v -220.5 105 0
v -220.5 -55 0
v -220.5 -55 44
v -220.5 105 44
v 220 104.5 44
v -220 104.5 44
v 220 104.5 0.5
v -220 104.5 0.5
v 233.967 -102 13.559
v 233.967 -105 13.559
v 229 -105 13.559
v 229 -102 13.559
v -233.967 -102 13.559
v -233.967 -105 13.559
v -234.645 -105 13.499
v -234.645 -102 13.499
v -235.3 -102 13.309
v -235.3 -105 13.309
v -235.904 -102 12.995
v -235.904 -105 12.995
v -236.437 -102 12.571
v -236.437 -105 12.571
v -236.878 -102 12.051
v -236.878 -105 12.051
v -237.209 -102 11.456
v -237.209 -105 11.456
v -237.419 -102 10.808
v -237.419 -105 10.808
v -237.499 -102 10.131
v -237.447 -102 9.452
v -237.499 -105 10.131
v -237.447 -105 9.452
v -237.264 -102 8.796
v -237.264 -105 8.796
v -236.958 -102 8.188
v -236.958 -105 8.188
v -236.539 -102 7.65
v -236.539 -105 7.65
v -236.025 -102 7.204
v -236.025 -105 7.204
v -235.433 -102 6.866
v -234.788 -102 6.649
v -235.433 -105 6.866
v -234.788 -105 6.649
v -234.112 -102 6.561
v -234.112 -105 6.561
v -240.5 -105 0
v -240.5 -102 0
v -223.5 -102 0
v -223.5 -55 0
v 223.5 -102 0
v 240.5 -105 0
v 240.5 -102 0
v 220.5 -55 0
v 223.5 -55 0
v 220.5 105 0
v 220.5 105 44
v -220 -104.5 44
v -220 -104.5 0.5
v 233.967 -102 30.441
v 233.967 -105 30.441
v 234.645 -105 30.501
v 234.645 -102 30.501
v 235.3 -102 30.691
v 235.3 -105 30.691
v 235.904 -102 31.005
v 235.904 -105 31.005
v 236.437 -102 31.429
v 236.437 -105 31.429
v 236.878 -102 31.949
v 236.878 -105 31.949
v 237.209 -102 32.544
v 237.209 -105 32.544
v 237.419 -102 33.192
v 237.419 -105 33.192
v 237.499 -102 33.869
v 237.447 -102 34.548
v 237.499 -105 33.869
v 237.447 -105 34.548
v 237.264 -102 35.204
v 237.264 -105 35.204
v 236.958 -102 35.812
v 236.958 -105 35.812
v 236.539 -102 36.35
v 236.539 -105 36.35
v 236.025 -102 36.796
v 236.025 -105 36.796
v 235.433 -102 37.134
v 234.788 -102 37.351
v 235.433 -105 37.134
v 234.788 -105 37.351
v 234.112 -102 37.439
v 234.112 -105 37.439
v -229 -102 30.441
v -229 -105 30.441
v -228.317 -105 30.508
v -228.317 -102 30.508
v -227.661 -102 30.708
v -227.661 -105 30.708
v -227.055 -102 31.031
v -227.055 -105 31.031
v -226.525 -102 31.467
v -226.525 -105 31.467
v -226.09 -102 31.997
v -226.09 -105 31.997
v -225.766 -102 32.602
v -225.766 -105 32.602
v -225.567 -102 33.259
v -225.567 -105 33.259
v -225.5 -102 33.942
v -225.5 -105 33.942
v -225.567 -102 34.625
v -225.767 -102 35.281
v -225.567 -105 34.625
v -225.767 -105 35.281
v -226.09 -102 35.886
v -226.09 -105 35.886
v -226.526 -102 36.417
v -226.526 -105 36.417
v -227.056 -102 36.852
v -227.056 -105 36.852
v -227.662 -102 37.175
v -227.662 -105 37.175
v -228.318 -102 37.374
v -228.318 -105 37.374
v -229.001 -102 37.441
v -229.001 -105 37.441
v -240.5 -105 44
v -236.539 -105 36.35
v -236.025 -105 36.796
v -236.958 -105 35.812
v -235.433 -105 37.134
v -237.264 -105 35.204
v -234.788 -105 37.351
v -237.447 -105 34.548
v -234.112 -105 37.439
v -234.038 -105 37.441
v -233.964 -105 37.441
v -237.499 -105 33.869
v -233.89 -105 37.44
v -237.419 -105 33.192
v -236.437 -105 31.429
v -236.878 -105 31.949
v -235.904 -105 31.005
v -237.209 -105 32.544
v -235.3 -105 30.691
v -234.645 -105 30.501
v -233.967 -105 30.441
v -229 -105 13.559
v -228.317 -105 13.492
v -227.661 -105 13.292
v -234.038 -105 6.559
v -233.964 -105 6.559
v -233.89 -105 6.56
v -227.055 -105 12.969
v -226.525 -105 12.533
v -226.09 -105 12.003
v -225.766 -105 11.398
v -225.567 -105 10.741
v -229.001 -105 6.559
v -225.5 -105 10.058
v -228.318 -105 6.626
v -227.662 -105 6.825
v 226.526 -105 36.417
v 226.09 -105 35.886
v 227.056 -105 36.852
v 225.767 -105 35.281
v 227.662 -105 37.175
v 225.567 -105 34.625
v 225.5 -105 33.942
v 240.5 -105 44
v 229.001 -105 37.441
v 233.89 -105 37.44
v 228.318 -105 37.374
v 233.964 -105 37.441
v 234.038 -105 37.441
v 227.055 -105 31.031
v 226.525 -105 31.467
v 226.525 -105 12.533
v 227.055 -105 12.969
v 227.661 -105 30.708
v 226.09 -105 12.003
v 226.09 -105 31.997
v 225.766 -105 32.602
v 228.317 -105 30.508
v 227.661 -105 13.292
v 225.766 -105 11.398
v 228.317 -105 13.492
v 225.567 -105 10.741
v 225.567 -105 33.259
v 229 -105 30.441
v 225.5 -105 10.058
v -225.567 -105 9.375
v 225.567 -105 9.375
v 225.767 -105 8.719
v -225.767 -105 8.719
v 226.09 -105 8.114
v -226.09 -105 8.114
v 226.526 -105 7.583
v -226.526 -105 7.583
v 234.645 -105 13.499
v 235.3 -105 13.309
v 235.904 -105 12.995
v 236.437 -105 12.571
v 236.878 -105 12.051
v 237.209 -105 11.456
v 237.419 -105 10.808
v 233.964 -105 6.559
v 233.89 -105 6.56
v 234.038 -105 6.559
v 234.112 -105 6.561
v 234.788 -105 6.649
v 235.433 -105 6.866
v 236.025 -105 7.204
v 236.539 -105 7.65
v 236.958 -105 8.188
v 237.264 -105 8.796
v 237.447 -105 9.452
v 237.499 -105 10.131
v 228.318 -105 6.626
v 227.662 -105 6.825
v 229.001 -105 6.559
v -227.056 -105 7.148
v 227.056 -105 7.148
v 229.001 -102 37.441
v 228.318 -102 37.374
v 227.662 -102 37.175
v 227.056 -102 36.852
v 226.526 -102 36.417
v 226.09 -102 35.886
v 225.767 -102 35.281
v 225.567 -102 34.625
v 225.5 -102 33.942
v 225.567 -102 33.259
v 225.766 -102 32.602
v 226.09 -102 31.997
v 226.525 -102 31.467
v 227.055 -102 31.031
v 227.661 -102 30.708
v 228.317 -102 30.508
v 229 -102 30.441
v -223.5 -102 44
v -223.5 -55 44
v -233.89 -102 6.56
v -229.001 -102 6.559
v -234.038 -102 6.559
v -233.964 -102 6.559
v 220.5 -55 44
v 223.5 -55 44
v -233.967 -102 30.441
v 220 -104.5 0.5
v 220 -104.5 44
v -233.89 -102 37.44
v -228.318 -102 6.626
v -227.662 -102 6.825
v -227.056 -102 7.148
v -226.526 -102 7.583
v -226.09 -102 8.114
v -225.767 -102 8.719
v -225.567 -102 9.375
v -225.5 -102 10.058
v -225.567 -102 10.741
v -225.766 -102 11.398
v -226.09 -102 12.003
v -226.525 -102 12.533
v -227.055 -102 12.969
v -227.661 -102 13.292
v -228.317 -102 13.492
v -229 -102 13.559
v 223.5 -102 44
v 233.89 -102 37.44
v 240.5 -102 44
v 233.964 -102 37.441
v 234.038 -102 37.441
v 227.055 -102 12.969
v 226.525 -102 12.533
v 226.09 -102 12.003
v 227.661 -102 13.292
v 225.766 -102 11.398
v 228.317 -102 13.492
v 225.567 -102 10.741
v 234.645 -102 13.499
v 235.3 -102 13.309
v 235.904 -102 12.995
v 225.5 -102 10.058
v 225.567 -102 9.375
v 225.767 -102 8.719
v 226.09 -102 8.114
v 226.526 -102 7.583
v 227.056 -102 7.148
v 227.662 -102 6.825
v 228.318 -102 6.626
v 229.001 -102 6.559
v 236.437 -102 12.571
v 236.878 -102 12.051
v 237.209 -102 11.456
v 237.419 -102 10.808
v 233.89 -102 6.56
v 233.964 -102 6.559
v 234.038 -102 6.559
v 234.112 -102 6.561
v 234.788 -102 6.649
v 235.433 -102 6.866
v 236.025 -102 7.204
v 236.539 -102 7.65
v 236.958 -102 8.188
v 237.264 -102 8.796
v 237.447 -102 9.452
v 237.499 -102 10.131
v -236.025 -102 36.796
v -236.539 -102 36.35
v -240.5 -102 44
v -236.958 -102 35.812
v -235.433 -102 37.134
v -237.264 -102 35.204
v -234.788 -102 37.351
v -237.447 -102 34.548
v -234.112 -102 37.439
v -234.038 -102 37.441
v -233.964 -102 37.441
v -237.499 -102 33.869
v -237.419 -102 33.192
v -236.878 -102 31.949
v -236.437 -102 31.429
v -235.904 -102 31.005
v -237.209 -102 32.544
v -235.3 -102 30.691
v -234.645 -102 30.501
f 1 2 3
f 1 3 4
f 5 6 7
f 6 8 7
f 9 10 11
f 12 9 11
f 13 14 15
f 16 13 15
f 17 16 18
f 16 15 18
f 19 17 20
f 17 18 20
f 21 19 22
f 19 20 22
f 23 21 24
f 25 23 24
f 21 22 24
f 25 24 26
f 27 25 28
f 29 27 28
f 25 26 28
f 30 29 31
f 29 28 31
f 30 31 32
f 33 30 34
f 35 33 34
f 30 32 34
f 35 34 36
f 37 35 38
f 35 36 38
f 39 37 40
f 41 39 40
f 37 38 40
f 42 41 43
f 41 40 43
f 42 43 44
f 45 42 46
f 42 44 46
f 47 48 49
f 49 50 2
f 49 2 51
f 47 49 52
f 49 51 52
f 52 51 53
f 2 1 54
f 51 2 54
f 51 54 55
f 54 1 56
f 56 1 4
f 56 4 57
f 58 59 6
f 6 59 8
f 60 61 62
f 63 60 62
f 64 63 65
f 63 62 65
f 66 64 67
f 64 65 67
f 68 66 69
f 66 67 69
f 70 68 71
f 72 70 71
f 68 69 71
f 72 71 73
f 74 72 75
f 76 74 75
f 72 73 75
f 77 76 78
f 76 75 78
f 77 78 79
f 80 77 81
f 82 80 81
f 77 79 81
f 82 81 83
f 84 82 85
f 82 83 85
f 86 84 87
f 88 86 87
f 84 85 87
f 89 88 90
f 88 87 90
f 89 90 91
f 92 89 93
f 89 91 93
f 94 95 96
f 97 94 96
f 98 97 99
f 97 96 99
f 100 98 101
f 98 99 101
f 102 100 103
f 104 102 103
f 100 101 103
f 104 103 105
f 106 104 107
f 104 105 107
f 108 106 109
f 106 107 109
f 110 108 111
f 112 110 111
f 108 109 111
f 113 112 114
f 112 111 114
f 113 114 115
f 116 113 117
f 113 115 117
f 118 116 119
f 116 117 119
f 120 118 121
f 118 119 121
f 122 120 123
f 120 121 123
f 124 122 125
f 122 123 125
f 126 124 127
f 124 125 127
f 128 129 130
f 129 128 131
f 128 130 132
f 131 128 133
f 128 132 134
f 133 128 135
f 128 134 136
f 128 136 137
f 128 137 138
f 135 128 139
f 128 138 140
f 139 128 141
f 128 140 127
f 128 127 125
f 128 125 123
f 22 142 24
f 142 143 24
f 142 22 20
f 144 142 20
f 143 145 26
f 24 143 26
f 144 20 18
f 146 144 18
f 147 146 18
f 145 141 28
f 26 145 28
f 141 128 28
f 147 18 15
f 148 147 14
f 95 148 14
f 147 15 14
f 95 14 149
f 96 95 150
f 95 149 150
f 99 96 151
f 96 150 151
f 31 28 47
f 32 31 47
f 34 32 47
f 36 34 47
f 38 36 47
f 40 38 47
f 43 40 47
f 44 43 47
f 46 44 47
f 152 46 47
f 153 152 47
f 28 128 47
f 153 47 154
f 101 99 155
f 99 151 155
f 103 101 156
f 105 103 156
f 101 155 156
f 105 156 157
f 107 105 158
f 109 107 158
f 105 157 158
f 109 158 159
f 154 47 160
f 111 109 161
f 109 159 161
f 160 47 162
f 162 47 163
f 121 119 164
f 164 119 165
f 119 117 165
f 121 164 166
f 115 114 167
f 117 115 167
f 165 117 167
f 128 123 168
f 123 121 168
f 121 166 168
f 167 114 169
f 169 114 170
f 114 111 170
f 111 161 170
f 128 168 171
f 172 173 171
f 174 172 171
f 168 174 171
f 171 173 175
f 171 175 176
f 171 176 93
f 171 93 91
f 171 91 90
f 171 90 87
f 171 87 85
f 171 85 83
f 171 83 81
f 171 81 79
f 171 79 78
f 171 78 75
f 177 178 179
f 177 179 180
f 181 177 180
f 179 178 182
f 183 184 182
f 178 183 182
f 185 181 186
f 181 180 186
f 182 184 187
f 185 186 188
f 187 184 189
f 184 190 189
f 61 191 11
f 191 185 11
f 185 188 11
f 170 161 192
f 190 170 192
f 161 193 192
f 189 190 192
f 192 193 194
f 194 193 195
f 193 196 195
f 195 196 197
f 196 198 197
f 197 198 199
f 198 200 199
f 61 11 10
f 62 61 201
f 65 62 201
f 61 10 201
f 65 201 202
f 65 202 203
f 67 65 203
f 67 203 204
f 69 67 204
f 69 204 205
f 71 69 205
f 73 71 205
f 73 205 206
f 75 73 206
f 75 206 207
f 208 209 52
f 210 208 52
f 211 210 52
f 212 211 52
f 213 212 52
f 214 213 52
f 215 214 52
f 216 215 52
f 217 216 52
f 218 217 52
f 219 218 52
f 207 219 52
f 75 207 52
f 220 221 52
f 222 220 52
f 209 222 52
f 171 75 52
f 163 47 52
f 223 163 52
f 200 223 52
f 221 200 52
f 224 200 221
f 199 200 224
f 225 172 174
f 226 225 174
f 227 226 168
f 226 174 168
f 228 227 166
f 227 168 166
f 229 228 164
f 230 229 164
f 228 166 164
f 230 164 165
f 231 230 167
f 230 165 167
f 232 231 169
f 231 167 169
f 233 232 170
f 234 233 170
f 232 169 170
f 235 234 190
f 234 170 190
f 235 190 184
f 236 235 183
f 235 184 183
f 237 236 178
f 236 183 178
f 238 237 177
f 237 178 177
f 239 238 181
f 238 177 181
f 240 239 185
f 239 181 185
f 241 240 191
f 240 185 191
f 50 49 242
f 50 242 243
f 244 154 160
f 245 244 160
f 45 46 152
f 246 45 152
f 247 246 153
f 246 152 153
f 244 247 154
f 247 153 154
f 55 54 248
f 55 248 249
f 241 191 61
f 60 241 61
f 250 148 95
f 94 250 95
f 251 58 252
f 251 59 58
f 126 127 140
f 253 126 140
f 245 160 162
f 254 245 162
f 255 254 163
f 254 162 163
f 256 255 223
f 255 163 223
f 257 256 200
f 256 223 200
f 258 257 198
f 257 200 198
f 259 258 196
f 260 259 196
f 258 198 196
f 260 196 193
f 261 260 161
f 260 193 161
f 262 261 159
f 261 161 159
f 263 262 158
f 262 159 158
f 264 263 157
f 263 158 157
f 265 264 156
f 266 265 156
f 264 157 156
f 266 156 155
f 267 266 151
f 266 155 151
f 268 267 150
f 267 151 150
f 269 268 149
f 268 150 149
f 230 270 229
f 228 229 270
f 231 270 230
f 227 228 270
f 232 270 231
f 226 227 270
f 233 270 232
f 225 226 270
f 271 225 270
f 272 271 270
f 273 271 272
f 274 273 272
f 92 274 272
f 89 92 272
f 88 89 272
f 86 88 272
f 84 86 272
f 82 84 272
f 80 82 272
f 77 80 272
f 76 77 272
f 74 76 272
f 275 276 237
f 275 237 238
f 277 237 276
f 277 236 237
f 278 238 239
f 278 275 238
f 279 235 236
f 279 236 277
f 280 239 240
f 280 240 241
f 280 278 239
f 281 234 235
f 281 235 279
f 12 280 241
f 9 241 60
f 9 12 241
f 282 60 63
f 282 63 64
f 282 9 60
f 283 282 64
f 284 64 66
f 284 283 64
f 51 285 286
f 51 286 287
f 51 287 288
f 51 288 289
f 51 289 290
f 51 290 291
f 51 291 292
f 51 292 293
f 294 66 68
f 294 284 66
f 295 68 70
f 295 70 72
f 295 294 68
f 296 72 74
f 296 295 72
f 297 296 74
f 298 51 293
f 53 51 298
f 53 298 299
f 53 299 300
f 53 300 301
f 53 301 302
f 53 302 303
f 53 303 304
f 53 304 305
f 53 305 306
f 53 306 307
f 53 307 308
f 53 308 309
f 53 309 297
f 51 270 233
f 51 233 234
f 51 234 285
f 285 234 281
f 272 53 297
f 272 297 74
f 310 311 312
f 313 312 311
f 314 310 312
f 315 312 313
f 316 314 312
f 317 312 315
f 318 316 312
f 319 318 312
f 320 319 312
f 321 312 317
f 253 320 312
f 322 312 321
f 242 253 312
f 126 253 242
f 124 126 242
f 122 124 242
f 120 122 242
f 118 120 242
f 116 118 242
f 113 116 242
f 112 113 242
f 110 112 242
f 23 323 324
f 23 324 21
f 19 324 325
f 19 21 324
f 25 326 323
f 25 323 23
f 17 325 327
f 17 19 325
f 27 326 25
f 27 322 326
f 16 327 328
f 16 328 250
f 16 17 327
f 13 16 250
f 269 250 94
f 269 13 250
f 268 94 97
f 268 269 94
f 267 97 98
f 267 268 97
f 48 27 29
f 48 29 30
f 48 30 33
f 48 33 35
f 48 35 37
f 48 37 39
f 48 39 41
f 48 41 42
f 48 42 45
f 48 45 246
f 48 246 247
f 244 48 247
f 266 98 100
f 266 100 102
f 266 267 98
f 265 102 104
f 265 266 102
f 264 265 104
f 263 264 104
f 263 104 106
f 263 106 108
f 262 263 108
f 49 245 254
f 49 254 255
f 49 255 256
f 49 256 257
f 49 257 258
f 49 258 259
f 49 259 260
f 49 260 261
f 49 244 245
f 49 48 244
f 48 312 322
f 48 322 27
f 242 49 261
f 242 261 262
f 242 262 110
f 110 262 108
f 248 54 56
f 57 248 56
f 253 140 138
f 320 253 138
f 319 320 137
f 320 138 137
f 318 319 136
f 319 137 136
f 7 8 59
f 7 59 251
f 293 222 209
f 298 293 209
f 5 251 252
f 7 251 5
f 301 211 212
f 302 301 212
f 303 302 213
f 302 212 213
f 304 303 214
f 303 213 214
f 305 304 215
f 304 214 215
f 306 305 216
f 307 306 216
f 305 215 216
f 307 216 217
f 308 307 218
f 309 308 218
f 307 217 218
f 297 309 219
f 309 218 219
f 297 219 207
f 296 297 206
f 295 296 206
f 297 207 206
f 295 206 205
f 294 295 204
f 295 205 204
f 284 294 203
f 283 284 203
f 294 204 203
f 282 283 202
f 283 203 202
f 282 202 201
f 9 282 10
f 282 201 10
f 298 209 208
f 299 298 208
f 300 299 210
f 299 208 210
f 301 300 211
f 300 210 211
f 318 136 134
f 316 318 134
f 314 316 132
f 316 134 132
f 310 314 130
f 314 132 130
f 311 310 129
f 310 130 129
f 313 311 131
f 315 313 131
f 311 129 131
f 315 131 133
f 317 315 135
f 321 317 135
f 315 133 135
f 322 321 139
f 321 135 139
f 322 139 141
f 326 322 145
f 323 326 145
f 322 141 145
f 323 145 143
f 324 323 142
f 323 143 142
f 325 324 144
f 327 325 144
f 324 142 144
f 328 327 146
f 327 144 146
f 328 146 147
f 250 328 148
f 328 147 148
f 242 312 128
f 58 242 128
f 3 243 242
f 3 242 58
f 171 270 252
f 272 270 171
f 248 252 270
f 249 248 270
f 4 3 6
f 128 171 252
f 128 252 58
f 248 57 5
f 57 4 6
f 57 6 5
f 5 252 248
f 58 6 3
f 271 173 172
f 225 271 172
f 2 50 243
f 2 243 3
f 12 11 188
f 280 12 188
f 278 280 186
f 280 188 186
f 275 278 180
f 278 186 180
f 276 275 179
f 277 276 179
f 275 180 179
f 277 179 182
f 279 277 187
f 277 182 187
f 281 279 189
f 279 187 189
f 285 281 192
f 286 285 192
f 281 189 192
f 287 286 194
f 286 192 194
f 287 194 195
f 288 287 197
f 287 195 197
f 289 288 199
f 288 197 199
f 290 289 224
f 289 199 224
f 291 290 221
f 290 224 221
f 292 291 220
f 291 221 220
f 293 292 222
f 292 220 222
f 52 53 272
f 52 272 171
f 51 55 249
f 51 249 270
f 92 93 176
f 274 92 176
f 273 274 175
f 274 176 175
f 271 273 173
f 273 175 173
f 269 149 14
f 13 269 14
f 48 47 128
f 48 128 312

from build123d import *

# Parameters (mm, degrees)
F0_W     = 441
F0_H     = 210
F1_DEPTH = 44
F2_T     = -0.5
F4_DEPTH = 44
F7_DEPTH = 3


with BuildPart() as f1:
    # F0 (on Top) → F1 (new body)
    with BuildSketch(Plane.XY):
        Rectangle(F0_W, F0_H)
    extrude(amount=F1_DEPTH)

    # F2
    f2_openings = [f1.faces().sort_by_distance(p)[0] for p in [
        (0, 0, 44),
    ]]
    offset(amount=F2_T, openings=f2_openings)


with BuildPart() as f4:
    # F3 (on face) → F4 (new body)
    with BuildSketch(Plane(origin=(0, 0, 0), x_dir=(1, 0, 0), z_dir=(0, 0, -1))):
        Polygon((-223.5, 55), (-220.5, 55), (-220.5, 105), (-240.5, 105), (-240.5, 102), (-223.5, 102), align=None)
        Polygon((220.5, 55), (223.5, 55), (223.5, 102), (240.5, 102), (240.5, 105), (220.5, 105), align=None)
    extrude(amount=-F4_DEPTH)

    # F5: union F1
    add(f1.part)

    # F6 (on face) → F7 (cut)
    with BuildSketch(Plane.XZ.offset(105)):
        with BuildLine():
            Line((-234.112281, 37.43943), (-233.890185, 37.439508))
            ThreePointArc((-233.890185, 37.439508), (-234.001233, 37.441231), (-234.112281, 37.43943))
        make_face()
        with BuildLine():
            Line((-229.001233, 37.441231), (-233.890185, 37.439508))
            Line((-233.890185, 37.439508), (-234.112281, 37.43943))
            ThreePointArc((-234.112281, 37.43943), (-237.499245, 33.868521), (-233.966869, 30.441388))
            Line((-233.966869, 30.441388), (-229.000111, 30.441232))
            ThreePointArc((-229.000111, 30.441232), (-225.5, 33.941793), (-229.001233, 37.441231))
        make_face()
        with BuildLine():
            Line((-229.000111, 13.558768), (-233.966869, 13.558612))
            ThreePointArc((-233.966869, 13.558612), (-237.499245, 10.131479), (-234.112281, 6.56057))
            Line((-234.112281, 6.56057), (-233.890185, 6.560492))
            Line((-233.890185, 6.560492), (-229.001233, 6.558769))
            ThreePointArc((-229.001233, 6.558769), (-225.5, 10.058207), (-229.000111, 13.558768))
        make_face()
        with BuildLine():
            Line((-233.890185, 6.560492), (-234.112281, 6.56057))
            ThreePointArc((-234.112281, 6.56057), (-234.001233, 6.558769), (-233.890185, 6.560492))
        make_face()
        with BuildLine():
            ThreePointArc((233.966869, 30.441388), (237.499245, 33.868521), (234.112281, 37.43943))
            Line((234.112281, 37.43943), (233.890185, 37.439508))
            Line((233.890185, 37.439508), (229.001233, 37.441231))
            ThreePointArc((229.001233, 37.441231), (225.5, 33.941793), (229.000111, 30.441232))
            Line((229.000111, 30.441232), (233.966869, 30.441388))
        make_face()
        with BuildLine():
            Line((233.890185, 37.439508), (234.112281, 37.43943))
            ThreePointArc((234.112281, 37.43943), (234.001233, 37.441231), (233.890185, 37.439508))
        make_face()
        with BuildLine():
            ThreePointArc((234.112281, 6.56057), (237.499245, 10.131479), (233.966869, 13.558612))
            Line((233.966869, 13.558612), (229.000111, 13.558768))
            ThreePointArc((229.000111, 13.558768), (225.5, 10.058207), (229.001233, 6.558769))
            Line((229.001233, 6.558769), (233.890185, 6.560492))
            Line((233.890185, 6.560492), (234.112281, 6.56057))
        make_face()
        with BuildLine():
            ThreePointArc((233.890185, 6.560492), (234.001233, 6.558769), (234.112281, 6.56057))
            Line((234.112281, 6.56057), (233.890185, 6.560492))
        make_face()
    extrude(amount=-F7_DEPTH, mode=Mode.SUBTRACT)


solid = f4.part
